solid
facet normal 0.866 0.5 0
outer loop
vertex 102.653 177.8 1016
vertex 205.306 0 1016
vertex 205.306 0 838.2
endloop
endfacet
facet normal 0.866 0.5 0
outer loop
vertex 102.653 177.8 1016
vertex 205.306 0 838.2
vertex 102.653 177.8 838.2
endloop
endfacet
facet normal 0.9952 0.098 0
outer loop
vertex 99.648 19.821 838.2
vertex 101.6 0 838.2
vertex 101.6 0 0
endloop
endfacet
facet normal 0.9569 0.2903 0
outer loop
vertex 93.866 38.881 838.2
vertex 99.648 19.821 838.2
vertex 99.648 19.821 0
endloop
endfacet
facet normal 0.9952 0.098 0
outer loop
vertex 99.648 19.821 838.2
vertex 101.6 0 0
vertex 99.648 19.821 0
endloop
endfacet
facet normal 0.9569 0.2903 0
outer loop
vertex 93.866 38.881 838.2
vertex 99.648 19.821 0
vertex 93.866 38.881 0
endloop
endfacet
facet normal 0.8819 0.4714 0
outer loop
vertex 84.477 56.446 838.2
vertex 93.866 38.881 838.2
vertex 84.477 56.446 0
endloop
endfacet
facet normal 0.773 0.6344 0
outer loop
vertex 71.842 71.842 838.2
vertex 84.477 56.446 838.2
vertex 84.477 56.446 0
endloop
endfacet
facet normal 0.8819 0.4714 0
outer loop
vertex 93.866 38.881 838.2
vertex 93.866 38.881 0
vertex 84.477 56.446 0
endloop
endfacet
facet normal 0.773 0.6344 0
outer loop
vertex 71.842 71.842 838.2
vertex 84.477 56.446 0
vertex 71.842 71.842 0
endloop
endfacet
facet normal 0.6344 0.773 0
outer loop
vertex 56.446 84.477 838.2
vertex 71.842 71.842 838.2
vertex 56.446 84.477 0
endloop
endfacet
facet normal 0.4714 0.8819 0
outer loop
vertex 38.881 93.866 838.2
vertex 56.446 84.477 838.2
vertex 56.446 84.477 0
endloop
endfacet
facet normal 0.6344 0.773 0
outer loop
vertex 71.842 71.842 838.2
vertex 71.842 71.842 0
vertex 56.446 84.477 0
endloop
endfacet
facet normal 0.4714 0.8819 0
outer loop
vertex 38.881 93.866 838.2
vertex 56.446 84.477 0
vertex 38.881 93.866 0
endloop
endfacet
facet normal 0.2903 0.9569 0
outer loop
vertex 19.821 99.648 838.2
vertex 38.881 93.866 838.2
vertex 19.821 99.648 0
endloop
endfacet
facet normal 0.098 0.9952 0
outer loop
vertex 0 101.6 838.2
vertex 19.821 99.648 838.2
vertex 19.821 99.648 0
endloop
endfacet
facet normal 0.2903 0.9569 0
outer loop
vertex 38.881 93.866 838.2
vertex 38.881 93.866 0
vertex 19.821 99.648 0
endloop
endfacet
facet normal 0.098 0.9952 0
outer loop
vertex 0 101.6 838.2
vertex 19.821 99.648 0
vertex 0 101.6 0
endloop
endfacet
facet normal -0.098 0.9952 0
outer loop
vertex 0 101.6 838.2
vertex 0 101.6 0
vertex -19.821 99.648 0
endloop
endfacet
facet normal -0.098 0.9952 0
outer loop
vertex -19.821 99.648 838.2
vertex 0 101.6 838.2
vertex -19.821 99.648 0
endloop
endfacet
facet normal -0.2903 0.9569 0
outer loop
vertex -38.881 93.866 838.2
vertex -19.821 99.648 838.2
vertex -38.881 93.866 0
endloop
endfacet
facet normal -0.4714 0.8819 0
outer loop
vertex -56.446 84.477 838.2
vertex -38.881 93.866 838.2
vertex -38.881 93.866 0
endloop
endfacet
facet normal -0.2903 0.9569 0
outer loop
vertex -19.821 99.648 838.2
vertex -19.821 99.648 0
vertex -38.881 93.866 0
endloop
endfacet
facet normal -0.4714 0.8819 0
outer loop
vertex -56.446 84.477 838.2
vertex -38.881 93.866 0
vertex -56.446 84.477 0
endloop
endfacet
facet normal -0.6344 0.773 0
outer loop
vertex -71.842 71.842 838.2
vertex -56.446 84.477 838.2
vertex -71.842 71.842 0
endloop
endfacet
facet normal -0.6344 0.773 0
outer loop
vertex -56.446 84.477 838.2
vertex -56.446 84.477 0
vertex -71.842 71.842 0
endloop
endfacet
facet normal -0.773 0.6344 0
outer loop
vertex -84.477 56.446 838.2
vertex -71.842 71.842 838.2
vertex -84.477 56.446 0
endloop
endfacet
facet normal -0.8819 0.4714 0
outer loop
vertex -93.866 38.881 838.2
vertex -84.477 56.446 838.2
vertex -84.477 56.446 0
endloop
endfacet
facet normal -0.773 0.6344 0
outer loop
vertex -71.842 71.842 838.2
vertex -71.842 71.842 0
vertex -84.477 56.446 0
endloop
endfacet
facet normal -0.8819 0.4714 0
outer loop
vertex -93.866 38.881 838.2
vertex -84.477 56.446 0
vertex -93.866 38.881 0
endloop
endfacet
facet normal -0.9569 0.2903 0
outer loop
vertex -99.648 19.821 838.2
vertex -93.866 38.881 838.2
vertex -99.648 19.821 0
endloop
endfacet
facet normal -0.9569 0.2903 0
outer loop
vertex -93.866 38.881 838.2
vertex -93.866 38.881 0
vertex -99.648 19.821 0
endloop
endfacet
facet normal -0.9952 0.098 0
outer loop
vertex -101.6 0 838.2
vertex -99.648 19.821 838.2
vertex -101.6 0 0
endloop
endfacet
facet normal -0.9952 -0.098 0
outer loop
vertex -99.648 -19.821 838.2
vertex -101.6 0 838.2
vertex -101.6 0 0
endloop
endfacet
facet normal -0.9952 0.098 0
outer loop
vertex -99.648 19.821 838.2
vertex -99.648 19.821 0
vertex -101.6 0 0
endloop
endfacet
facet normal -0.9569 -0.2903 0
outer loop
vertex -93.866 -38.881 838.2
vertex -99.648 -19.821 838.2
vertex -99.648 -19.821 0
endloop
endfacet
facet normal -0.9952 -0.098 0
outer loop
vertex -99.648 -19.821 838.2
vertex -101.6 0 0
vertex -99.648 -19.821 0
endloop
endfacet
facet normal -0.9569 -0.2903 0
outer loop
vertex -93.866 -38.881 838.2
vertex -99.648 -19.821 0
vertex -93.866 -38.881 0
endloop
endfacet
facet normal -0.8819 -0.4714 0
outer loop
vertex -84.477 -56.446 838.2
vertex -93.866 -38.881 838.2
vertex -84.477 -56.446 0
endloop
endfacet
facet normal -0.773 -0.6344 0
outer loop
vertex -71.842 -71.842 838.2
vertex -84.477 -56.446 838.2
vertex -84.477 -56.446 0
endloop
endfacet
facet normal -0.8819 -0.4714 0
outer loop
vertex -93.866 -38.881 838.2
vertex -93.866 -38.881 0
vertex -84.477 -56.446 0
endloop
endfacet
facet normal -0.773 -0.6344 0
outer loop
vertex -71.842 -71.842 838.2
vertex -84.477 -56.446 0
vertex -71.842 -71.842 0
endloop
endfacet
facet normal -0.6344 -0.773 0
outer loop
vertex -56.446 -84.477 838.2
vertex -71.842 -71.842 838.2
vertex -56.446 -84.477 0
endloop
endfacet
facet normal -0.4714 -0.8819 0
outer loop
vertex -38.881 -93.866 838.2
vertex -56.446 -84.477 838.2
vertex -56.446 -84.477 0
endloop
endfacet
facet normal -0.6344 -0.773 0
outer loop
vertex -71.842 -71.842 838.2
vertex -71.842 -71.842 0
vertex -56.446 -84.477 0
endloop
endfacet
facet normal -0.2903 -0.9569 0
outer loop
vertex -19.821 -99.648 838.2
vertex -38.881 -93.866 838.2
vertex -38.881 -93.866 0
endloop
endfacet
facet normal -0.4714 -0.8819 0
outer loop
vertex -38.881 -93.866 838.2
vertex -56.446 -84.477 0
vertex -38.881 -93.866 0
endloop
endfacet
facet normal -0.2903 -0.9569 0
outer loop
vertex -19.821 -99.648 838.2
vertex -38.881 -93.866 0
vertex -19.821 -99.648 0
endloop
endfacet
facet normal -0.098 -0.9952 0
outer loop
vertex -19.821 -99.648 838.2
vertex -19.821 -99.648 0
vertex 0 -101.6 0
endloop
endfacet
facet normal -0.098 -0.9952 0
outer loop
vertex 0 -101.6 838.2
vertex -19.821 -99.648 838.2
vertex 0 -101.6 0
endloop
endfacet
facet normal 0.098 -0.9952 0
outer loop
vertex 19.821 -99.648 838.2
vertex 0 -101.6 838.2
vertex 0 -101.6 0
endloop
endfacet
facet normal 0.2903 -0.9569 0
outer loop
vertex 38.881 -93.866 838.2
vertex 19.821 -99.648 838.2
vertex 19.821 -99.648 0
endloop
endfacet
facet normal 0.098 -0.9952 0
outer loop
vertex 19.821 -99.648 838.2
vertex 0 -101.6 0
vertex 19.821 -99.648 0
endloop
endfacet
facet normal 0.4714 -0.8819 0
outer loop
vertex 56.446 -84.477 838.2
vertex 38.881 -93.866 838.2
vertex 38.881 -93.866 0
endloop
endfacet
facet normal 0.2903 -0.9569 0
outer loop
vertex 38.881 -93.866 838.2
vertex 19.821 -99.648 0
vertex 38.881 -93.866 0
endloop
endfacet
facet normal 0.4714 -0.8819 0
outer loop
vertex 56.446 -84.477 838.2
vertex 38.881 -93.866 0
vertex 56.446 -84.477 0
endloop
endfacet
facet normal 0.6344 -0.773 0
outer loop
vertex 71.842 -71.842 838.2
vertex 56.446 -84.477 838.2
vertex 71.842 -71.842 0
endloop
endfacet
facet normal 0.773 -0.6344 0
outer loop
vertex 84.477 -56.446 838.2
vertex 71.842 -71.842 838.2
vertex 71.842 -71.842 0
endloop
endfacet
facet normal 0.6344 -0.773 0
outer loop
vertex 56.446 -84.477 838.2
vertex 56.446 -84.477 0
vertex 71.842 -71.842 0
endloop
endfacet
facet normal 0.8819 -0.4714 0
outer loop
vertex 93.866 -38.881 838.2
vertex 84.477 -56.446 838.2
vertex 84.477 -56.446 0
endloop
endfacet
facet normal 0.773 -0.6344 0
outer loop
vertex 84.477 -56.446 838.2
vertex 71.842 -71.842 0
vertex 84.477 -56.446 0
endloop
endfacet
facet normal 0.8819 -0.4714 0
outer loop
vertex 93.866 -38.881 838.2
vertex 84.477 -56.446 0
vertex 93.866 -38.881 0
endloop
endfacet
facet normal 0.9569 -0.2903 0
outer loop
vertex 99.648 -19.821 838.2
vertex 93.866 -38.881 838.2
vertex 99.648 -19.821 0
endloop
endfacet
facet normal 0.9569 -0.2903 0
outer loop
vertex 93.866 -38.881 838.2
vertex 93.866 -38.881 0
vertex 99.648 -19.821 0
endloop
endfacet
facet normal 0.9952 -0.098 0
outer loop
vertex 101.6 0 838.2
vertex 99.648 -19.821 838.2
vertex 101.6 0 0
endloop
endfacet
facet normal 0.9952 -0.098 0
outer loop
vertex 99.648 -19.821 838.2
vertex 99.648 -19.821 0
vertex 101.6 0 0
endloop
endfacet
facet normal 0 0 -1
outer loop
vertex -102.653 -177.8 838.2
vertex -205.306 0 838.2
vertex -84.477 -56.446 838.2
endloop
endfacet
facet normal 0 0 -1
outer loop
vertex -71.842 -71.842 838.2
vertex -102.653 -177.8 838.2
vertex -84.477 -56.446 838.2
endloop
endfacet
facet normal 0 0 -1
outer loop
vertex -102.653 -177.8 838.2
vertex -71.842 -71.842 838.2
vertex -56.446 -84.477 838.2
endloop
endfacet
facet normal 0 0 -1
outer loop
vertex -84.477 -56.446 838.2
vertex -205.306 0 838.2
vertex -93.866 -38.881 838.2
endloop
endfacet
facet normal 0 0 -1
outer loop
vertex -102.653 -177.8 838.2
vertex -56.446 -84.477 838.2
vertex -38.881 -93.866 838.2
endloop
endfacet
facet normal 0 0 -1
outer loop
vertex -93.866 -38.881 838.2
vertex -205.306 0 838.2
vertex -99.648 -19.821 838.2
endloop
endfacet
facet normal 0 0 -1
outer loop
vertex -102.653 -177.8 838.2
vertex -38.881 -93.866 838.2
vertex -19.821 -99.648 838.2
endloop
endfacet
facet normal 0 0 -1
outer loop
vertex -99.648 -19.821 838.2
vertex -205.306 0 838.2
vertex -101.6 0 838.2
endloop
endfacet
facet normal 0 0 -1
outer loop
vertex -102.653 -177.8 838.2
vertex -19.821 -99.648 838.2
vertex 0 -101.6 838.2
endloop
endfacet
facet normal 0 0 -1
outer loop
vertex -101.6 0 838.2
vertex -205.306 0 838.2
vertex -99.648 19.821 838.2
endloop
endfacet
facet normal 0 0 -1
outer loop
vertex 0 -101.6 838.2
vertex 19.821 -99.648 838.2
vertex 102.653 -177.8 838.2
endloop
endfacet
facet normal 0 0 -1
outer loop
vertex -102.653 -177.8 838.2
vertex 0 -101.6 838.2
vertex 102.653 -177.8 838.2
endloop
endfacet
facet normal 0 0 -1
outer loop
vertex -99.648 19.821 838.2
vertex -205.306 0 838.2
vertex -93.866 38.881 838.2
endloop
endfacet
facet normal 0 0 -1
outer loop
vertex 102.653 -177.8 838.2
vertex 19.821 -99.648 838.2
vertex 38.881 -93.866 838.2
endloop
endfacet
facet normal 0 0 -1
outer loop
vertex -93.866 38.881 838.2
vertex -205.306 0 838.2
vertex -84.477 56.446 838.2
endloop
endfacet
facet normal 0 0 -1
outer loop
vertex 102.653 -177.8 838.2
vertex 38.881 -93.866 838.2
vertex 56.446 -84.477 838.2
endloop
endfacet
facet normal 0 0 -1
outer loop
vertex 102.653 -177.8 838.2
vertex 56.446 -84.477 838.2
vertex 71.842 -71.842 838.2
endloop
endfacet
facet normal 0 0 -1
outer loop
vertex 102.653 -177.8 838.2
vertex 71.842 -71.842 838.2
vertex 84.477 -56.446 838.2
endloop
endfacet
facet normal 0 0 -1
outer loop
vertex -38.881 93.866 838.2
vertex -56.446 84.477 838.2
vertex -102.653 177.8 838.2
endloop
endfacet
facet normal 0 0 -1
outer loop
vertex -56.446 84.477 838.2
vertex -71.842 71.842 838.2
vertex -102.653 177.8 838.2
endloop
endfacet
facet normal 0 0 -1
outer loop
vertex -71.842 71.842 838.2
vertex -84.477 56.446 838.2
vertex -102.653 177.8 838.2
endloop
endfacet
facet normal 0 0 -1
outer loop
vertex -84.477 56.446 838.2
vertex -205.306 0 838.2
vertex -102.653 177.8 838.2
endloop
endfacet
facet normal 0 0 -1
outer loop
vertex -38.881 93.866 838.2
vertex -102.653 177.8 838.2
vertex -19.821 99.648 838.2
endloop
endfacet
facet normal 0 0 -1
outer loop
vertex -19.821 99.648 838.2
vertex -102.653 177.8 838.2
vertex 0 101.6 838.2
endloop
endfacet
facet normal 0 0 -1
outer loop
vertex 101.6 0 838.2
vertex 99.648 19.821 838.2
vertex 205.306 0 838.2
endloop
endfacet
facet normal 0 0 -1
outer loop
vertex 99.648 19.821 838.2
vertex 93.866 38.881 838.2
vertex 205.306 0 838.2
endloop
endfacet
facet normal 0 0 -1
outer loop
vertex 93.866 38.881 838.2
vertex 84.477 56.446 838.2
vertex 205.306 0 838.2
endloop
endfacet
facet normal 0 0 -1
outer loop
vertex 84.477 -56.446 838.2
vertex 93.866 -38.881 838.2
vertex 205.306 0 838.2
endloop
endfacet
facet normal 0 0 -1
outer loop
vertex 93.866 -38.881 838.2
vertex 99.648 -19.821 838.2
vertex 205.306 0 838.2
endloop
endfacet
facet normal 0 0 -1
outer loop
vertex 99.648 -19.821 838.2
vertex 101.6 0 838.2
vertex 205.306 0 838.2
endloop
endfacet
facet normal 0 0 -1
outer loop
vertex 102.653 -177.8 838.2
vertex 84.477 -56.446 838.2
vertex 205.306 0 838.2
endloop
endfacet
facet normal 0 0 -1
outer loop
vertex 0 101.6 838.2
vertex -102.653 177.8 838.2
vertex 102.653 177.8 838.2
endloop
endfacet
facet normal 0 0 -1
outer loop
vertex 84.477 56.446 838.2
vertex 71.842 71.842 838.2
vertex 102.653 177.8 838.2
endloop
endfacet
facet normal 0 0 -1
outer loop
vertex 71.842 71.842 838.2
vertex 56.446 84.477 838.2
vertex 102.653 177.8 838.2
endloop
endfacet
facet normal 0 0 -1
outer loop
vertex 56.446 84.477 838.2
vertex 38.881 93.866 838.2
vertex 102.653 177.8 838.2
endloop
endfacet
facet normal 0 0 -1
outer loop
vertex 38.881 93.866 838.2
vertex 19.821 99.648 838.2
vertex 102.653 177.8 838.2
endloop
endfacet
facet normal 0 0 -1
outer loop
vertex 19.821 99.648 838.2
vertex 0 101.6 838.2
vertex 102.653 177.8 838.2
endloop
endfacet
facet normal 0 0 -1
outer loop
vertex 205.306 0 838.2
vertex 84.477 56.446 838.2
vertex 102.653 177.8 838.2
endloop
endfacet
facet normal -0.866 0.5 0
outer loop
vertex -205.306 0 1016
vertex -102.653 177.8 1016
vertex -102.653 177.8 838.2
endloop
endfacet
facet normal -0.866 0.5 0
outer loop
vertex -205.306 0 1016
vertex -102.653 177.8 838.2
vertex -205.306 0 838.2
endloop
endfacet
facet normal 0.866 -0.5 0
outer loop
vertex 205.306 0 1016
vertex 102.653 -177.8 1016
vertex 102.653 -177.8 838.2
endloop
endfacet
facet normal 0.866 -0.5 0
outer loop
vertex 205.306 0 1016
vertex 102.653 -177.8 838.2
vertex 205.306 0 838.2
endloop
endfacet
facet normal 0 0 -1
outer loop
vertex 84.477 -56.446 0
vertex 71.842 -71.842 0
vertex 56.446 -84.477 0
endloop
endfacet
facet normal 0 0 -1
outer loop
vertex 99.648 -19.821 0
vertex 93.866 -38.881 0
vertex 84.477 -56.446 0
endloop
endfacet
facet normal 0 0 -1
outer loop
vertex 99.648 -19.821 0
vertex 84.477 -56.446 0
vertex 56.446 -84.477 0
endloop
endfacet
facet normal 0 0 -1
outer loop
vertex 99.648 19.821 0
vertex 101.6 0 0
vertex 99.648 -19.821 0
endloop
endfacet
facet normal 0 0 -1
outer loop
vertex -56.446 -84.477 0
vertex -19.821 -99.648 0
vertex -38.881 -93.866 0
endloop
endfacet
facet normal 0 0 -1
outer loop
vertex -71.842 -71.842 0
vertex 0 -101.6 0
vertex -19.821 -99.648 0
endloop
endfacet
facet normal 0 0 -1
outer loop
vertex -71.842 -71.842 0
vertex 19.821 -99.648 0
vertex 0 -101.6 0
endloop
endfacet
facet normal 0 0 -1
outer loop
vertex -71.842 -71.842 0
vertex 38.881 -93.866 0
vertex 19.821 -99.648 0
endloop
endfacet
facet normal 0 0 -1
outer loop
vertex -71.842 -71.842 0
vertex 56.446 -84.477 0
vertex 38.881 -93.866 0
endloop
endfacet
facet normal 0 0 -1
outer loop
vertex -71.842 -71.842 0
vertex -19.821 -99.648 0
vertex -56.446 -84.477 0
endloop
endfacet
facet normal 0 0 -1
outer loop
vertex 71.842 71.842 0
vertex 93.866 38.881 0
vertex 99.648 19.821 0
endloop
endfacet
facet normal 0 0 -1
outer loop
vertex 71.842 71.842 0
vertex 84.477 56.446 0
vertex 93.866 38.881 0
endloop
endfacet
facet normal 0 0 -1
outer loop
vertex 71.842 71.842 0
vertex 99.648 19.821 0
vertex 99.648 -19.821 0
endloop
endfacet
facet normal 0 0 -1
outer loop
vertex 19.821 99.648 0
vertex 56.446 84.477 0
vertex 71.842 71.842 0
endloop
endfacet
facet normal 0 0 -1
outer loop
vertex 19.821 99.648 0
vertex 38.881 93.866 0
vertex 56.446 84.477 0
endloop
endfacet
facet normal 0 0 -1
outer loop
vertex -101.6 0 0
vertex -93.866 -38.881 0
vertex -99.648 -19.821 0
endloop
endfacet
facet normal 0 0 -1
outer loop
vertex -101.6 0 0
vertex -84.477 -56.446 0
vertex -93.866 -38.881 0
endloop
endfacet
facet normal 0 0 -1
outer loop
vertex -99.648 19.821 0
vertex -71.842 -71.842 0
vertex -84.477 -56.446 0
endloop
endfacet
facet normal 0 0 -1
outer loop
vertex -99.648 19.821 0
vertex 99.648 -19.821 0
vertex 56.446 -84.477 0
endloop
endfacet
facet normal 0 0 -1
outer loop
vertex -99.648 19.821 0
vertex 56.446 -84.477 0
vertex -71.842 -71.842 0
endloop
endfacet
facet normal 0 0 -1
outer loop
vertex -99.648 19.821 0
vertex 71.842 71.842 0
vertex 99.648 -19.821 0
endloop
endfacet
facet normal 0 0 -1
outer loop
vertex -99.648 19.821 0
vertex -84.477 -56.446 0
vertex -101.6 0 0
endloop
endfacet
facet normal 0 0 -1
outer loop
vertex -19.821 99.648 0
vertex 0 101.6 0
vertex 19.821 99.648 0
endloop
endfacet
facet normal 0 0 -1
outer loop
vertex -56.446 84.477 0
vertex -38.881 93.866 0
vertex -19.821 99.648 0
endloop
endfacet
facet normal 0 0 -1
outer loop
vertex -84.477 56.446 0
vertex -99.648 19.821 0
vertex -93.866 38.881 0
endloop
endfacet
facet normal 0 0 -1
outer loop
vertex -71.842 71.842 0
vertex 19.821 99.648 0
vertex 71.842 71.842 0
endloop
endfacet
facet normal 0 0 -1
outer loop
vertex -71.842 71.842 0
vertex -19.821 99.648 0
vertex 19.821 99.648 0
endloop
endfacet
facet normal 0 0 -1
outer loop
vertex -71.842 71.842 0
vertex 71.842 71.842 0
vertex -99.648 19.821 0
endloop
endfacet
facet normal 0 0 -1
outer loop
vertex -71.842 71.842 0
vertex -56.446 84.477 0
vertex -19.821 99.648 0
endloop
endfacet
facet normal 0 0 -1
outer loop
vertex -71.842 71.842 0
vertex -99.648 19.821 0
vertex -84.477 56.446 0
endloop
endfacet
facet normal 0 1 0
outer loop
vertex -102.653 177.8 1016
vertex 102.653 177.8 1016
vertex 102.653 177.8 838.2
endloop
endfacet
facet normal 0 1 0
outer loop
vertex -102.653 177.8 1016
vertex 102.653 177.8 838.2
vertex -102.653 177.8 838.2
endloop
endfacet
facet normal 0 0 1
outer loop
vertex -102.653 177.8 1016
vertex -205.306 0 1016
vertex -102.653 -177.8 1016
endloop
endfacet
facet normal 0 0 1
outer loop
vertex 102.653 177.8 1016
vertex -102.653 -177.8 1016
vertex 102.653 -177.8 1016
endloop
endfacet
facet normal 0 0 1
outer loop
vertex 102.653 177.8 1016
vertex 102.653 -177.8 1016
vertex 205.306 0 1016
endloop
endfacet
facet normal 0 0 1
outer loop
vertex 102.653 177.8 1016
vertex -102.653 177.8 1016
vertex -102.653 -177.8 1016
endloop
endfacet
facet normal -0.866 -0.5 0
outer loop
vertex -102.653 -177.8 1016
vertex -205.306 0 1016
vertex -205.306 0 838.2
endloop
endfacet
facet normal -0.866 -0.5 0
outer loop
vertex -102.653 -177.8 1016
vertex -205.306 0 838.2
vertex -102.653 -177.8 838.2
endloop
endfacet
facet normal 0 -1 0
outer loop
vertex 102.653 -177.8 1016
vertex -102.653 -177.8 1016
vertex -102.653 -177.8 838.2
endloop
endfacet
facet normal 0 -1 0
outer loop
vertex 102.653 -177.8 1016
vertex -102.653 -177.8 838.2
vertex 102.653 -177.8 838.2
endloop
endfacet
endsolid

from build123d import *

# Parameters (mm, degrees)
BOSS_EXTRUDE1_DEPTH = 177.8
SKETCH2_W           = 101.6
SKETCH2_H           = 838.2


with BuildPart() as part:
    # Sketch1 → Boss-Extrude1 (new body)
    with BuildSketch(Plane.XY.offset(1016)):
        Polygon((-102.652877862, -177.8), (102.652877862, -177.8), (205.305755724, 0), (102.652877862, 177.8), (-102.652877862, 177.8), (-205.305755724, 0), align=None)
    extrude(amount=-BOSS_EXTRUDE1_DEPTH)

    # Sketch2 → Revolve1 (revolve)
    with BuildSketch(Plane(origin=(0, 0, 0), x_dir=(1, 0, 0), z_dir=(0, 1, 0))):
        with Locations((50.8, -419.1)):
            Rectangle(SKETCH2_W, SKETCH2_H)
    revolve(axis=Axis((0, 0, 0), (0, 0, 1)))


solid = part.part
